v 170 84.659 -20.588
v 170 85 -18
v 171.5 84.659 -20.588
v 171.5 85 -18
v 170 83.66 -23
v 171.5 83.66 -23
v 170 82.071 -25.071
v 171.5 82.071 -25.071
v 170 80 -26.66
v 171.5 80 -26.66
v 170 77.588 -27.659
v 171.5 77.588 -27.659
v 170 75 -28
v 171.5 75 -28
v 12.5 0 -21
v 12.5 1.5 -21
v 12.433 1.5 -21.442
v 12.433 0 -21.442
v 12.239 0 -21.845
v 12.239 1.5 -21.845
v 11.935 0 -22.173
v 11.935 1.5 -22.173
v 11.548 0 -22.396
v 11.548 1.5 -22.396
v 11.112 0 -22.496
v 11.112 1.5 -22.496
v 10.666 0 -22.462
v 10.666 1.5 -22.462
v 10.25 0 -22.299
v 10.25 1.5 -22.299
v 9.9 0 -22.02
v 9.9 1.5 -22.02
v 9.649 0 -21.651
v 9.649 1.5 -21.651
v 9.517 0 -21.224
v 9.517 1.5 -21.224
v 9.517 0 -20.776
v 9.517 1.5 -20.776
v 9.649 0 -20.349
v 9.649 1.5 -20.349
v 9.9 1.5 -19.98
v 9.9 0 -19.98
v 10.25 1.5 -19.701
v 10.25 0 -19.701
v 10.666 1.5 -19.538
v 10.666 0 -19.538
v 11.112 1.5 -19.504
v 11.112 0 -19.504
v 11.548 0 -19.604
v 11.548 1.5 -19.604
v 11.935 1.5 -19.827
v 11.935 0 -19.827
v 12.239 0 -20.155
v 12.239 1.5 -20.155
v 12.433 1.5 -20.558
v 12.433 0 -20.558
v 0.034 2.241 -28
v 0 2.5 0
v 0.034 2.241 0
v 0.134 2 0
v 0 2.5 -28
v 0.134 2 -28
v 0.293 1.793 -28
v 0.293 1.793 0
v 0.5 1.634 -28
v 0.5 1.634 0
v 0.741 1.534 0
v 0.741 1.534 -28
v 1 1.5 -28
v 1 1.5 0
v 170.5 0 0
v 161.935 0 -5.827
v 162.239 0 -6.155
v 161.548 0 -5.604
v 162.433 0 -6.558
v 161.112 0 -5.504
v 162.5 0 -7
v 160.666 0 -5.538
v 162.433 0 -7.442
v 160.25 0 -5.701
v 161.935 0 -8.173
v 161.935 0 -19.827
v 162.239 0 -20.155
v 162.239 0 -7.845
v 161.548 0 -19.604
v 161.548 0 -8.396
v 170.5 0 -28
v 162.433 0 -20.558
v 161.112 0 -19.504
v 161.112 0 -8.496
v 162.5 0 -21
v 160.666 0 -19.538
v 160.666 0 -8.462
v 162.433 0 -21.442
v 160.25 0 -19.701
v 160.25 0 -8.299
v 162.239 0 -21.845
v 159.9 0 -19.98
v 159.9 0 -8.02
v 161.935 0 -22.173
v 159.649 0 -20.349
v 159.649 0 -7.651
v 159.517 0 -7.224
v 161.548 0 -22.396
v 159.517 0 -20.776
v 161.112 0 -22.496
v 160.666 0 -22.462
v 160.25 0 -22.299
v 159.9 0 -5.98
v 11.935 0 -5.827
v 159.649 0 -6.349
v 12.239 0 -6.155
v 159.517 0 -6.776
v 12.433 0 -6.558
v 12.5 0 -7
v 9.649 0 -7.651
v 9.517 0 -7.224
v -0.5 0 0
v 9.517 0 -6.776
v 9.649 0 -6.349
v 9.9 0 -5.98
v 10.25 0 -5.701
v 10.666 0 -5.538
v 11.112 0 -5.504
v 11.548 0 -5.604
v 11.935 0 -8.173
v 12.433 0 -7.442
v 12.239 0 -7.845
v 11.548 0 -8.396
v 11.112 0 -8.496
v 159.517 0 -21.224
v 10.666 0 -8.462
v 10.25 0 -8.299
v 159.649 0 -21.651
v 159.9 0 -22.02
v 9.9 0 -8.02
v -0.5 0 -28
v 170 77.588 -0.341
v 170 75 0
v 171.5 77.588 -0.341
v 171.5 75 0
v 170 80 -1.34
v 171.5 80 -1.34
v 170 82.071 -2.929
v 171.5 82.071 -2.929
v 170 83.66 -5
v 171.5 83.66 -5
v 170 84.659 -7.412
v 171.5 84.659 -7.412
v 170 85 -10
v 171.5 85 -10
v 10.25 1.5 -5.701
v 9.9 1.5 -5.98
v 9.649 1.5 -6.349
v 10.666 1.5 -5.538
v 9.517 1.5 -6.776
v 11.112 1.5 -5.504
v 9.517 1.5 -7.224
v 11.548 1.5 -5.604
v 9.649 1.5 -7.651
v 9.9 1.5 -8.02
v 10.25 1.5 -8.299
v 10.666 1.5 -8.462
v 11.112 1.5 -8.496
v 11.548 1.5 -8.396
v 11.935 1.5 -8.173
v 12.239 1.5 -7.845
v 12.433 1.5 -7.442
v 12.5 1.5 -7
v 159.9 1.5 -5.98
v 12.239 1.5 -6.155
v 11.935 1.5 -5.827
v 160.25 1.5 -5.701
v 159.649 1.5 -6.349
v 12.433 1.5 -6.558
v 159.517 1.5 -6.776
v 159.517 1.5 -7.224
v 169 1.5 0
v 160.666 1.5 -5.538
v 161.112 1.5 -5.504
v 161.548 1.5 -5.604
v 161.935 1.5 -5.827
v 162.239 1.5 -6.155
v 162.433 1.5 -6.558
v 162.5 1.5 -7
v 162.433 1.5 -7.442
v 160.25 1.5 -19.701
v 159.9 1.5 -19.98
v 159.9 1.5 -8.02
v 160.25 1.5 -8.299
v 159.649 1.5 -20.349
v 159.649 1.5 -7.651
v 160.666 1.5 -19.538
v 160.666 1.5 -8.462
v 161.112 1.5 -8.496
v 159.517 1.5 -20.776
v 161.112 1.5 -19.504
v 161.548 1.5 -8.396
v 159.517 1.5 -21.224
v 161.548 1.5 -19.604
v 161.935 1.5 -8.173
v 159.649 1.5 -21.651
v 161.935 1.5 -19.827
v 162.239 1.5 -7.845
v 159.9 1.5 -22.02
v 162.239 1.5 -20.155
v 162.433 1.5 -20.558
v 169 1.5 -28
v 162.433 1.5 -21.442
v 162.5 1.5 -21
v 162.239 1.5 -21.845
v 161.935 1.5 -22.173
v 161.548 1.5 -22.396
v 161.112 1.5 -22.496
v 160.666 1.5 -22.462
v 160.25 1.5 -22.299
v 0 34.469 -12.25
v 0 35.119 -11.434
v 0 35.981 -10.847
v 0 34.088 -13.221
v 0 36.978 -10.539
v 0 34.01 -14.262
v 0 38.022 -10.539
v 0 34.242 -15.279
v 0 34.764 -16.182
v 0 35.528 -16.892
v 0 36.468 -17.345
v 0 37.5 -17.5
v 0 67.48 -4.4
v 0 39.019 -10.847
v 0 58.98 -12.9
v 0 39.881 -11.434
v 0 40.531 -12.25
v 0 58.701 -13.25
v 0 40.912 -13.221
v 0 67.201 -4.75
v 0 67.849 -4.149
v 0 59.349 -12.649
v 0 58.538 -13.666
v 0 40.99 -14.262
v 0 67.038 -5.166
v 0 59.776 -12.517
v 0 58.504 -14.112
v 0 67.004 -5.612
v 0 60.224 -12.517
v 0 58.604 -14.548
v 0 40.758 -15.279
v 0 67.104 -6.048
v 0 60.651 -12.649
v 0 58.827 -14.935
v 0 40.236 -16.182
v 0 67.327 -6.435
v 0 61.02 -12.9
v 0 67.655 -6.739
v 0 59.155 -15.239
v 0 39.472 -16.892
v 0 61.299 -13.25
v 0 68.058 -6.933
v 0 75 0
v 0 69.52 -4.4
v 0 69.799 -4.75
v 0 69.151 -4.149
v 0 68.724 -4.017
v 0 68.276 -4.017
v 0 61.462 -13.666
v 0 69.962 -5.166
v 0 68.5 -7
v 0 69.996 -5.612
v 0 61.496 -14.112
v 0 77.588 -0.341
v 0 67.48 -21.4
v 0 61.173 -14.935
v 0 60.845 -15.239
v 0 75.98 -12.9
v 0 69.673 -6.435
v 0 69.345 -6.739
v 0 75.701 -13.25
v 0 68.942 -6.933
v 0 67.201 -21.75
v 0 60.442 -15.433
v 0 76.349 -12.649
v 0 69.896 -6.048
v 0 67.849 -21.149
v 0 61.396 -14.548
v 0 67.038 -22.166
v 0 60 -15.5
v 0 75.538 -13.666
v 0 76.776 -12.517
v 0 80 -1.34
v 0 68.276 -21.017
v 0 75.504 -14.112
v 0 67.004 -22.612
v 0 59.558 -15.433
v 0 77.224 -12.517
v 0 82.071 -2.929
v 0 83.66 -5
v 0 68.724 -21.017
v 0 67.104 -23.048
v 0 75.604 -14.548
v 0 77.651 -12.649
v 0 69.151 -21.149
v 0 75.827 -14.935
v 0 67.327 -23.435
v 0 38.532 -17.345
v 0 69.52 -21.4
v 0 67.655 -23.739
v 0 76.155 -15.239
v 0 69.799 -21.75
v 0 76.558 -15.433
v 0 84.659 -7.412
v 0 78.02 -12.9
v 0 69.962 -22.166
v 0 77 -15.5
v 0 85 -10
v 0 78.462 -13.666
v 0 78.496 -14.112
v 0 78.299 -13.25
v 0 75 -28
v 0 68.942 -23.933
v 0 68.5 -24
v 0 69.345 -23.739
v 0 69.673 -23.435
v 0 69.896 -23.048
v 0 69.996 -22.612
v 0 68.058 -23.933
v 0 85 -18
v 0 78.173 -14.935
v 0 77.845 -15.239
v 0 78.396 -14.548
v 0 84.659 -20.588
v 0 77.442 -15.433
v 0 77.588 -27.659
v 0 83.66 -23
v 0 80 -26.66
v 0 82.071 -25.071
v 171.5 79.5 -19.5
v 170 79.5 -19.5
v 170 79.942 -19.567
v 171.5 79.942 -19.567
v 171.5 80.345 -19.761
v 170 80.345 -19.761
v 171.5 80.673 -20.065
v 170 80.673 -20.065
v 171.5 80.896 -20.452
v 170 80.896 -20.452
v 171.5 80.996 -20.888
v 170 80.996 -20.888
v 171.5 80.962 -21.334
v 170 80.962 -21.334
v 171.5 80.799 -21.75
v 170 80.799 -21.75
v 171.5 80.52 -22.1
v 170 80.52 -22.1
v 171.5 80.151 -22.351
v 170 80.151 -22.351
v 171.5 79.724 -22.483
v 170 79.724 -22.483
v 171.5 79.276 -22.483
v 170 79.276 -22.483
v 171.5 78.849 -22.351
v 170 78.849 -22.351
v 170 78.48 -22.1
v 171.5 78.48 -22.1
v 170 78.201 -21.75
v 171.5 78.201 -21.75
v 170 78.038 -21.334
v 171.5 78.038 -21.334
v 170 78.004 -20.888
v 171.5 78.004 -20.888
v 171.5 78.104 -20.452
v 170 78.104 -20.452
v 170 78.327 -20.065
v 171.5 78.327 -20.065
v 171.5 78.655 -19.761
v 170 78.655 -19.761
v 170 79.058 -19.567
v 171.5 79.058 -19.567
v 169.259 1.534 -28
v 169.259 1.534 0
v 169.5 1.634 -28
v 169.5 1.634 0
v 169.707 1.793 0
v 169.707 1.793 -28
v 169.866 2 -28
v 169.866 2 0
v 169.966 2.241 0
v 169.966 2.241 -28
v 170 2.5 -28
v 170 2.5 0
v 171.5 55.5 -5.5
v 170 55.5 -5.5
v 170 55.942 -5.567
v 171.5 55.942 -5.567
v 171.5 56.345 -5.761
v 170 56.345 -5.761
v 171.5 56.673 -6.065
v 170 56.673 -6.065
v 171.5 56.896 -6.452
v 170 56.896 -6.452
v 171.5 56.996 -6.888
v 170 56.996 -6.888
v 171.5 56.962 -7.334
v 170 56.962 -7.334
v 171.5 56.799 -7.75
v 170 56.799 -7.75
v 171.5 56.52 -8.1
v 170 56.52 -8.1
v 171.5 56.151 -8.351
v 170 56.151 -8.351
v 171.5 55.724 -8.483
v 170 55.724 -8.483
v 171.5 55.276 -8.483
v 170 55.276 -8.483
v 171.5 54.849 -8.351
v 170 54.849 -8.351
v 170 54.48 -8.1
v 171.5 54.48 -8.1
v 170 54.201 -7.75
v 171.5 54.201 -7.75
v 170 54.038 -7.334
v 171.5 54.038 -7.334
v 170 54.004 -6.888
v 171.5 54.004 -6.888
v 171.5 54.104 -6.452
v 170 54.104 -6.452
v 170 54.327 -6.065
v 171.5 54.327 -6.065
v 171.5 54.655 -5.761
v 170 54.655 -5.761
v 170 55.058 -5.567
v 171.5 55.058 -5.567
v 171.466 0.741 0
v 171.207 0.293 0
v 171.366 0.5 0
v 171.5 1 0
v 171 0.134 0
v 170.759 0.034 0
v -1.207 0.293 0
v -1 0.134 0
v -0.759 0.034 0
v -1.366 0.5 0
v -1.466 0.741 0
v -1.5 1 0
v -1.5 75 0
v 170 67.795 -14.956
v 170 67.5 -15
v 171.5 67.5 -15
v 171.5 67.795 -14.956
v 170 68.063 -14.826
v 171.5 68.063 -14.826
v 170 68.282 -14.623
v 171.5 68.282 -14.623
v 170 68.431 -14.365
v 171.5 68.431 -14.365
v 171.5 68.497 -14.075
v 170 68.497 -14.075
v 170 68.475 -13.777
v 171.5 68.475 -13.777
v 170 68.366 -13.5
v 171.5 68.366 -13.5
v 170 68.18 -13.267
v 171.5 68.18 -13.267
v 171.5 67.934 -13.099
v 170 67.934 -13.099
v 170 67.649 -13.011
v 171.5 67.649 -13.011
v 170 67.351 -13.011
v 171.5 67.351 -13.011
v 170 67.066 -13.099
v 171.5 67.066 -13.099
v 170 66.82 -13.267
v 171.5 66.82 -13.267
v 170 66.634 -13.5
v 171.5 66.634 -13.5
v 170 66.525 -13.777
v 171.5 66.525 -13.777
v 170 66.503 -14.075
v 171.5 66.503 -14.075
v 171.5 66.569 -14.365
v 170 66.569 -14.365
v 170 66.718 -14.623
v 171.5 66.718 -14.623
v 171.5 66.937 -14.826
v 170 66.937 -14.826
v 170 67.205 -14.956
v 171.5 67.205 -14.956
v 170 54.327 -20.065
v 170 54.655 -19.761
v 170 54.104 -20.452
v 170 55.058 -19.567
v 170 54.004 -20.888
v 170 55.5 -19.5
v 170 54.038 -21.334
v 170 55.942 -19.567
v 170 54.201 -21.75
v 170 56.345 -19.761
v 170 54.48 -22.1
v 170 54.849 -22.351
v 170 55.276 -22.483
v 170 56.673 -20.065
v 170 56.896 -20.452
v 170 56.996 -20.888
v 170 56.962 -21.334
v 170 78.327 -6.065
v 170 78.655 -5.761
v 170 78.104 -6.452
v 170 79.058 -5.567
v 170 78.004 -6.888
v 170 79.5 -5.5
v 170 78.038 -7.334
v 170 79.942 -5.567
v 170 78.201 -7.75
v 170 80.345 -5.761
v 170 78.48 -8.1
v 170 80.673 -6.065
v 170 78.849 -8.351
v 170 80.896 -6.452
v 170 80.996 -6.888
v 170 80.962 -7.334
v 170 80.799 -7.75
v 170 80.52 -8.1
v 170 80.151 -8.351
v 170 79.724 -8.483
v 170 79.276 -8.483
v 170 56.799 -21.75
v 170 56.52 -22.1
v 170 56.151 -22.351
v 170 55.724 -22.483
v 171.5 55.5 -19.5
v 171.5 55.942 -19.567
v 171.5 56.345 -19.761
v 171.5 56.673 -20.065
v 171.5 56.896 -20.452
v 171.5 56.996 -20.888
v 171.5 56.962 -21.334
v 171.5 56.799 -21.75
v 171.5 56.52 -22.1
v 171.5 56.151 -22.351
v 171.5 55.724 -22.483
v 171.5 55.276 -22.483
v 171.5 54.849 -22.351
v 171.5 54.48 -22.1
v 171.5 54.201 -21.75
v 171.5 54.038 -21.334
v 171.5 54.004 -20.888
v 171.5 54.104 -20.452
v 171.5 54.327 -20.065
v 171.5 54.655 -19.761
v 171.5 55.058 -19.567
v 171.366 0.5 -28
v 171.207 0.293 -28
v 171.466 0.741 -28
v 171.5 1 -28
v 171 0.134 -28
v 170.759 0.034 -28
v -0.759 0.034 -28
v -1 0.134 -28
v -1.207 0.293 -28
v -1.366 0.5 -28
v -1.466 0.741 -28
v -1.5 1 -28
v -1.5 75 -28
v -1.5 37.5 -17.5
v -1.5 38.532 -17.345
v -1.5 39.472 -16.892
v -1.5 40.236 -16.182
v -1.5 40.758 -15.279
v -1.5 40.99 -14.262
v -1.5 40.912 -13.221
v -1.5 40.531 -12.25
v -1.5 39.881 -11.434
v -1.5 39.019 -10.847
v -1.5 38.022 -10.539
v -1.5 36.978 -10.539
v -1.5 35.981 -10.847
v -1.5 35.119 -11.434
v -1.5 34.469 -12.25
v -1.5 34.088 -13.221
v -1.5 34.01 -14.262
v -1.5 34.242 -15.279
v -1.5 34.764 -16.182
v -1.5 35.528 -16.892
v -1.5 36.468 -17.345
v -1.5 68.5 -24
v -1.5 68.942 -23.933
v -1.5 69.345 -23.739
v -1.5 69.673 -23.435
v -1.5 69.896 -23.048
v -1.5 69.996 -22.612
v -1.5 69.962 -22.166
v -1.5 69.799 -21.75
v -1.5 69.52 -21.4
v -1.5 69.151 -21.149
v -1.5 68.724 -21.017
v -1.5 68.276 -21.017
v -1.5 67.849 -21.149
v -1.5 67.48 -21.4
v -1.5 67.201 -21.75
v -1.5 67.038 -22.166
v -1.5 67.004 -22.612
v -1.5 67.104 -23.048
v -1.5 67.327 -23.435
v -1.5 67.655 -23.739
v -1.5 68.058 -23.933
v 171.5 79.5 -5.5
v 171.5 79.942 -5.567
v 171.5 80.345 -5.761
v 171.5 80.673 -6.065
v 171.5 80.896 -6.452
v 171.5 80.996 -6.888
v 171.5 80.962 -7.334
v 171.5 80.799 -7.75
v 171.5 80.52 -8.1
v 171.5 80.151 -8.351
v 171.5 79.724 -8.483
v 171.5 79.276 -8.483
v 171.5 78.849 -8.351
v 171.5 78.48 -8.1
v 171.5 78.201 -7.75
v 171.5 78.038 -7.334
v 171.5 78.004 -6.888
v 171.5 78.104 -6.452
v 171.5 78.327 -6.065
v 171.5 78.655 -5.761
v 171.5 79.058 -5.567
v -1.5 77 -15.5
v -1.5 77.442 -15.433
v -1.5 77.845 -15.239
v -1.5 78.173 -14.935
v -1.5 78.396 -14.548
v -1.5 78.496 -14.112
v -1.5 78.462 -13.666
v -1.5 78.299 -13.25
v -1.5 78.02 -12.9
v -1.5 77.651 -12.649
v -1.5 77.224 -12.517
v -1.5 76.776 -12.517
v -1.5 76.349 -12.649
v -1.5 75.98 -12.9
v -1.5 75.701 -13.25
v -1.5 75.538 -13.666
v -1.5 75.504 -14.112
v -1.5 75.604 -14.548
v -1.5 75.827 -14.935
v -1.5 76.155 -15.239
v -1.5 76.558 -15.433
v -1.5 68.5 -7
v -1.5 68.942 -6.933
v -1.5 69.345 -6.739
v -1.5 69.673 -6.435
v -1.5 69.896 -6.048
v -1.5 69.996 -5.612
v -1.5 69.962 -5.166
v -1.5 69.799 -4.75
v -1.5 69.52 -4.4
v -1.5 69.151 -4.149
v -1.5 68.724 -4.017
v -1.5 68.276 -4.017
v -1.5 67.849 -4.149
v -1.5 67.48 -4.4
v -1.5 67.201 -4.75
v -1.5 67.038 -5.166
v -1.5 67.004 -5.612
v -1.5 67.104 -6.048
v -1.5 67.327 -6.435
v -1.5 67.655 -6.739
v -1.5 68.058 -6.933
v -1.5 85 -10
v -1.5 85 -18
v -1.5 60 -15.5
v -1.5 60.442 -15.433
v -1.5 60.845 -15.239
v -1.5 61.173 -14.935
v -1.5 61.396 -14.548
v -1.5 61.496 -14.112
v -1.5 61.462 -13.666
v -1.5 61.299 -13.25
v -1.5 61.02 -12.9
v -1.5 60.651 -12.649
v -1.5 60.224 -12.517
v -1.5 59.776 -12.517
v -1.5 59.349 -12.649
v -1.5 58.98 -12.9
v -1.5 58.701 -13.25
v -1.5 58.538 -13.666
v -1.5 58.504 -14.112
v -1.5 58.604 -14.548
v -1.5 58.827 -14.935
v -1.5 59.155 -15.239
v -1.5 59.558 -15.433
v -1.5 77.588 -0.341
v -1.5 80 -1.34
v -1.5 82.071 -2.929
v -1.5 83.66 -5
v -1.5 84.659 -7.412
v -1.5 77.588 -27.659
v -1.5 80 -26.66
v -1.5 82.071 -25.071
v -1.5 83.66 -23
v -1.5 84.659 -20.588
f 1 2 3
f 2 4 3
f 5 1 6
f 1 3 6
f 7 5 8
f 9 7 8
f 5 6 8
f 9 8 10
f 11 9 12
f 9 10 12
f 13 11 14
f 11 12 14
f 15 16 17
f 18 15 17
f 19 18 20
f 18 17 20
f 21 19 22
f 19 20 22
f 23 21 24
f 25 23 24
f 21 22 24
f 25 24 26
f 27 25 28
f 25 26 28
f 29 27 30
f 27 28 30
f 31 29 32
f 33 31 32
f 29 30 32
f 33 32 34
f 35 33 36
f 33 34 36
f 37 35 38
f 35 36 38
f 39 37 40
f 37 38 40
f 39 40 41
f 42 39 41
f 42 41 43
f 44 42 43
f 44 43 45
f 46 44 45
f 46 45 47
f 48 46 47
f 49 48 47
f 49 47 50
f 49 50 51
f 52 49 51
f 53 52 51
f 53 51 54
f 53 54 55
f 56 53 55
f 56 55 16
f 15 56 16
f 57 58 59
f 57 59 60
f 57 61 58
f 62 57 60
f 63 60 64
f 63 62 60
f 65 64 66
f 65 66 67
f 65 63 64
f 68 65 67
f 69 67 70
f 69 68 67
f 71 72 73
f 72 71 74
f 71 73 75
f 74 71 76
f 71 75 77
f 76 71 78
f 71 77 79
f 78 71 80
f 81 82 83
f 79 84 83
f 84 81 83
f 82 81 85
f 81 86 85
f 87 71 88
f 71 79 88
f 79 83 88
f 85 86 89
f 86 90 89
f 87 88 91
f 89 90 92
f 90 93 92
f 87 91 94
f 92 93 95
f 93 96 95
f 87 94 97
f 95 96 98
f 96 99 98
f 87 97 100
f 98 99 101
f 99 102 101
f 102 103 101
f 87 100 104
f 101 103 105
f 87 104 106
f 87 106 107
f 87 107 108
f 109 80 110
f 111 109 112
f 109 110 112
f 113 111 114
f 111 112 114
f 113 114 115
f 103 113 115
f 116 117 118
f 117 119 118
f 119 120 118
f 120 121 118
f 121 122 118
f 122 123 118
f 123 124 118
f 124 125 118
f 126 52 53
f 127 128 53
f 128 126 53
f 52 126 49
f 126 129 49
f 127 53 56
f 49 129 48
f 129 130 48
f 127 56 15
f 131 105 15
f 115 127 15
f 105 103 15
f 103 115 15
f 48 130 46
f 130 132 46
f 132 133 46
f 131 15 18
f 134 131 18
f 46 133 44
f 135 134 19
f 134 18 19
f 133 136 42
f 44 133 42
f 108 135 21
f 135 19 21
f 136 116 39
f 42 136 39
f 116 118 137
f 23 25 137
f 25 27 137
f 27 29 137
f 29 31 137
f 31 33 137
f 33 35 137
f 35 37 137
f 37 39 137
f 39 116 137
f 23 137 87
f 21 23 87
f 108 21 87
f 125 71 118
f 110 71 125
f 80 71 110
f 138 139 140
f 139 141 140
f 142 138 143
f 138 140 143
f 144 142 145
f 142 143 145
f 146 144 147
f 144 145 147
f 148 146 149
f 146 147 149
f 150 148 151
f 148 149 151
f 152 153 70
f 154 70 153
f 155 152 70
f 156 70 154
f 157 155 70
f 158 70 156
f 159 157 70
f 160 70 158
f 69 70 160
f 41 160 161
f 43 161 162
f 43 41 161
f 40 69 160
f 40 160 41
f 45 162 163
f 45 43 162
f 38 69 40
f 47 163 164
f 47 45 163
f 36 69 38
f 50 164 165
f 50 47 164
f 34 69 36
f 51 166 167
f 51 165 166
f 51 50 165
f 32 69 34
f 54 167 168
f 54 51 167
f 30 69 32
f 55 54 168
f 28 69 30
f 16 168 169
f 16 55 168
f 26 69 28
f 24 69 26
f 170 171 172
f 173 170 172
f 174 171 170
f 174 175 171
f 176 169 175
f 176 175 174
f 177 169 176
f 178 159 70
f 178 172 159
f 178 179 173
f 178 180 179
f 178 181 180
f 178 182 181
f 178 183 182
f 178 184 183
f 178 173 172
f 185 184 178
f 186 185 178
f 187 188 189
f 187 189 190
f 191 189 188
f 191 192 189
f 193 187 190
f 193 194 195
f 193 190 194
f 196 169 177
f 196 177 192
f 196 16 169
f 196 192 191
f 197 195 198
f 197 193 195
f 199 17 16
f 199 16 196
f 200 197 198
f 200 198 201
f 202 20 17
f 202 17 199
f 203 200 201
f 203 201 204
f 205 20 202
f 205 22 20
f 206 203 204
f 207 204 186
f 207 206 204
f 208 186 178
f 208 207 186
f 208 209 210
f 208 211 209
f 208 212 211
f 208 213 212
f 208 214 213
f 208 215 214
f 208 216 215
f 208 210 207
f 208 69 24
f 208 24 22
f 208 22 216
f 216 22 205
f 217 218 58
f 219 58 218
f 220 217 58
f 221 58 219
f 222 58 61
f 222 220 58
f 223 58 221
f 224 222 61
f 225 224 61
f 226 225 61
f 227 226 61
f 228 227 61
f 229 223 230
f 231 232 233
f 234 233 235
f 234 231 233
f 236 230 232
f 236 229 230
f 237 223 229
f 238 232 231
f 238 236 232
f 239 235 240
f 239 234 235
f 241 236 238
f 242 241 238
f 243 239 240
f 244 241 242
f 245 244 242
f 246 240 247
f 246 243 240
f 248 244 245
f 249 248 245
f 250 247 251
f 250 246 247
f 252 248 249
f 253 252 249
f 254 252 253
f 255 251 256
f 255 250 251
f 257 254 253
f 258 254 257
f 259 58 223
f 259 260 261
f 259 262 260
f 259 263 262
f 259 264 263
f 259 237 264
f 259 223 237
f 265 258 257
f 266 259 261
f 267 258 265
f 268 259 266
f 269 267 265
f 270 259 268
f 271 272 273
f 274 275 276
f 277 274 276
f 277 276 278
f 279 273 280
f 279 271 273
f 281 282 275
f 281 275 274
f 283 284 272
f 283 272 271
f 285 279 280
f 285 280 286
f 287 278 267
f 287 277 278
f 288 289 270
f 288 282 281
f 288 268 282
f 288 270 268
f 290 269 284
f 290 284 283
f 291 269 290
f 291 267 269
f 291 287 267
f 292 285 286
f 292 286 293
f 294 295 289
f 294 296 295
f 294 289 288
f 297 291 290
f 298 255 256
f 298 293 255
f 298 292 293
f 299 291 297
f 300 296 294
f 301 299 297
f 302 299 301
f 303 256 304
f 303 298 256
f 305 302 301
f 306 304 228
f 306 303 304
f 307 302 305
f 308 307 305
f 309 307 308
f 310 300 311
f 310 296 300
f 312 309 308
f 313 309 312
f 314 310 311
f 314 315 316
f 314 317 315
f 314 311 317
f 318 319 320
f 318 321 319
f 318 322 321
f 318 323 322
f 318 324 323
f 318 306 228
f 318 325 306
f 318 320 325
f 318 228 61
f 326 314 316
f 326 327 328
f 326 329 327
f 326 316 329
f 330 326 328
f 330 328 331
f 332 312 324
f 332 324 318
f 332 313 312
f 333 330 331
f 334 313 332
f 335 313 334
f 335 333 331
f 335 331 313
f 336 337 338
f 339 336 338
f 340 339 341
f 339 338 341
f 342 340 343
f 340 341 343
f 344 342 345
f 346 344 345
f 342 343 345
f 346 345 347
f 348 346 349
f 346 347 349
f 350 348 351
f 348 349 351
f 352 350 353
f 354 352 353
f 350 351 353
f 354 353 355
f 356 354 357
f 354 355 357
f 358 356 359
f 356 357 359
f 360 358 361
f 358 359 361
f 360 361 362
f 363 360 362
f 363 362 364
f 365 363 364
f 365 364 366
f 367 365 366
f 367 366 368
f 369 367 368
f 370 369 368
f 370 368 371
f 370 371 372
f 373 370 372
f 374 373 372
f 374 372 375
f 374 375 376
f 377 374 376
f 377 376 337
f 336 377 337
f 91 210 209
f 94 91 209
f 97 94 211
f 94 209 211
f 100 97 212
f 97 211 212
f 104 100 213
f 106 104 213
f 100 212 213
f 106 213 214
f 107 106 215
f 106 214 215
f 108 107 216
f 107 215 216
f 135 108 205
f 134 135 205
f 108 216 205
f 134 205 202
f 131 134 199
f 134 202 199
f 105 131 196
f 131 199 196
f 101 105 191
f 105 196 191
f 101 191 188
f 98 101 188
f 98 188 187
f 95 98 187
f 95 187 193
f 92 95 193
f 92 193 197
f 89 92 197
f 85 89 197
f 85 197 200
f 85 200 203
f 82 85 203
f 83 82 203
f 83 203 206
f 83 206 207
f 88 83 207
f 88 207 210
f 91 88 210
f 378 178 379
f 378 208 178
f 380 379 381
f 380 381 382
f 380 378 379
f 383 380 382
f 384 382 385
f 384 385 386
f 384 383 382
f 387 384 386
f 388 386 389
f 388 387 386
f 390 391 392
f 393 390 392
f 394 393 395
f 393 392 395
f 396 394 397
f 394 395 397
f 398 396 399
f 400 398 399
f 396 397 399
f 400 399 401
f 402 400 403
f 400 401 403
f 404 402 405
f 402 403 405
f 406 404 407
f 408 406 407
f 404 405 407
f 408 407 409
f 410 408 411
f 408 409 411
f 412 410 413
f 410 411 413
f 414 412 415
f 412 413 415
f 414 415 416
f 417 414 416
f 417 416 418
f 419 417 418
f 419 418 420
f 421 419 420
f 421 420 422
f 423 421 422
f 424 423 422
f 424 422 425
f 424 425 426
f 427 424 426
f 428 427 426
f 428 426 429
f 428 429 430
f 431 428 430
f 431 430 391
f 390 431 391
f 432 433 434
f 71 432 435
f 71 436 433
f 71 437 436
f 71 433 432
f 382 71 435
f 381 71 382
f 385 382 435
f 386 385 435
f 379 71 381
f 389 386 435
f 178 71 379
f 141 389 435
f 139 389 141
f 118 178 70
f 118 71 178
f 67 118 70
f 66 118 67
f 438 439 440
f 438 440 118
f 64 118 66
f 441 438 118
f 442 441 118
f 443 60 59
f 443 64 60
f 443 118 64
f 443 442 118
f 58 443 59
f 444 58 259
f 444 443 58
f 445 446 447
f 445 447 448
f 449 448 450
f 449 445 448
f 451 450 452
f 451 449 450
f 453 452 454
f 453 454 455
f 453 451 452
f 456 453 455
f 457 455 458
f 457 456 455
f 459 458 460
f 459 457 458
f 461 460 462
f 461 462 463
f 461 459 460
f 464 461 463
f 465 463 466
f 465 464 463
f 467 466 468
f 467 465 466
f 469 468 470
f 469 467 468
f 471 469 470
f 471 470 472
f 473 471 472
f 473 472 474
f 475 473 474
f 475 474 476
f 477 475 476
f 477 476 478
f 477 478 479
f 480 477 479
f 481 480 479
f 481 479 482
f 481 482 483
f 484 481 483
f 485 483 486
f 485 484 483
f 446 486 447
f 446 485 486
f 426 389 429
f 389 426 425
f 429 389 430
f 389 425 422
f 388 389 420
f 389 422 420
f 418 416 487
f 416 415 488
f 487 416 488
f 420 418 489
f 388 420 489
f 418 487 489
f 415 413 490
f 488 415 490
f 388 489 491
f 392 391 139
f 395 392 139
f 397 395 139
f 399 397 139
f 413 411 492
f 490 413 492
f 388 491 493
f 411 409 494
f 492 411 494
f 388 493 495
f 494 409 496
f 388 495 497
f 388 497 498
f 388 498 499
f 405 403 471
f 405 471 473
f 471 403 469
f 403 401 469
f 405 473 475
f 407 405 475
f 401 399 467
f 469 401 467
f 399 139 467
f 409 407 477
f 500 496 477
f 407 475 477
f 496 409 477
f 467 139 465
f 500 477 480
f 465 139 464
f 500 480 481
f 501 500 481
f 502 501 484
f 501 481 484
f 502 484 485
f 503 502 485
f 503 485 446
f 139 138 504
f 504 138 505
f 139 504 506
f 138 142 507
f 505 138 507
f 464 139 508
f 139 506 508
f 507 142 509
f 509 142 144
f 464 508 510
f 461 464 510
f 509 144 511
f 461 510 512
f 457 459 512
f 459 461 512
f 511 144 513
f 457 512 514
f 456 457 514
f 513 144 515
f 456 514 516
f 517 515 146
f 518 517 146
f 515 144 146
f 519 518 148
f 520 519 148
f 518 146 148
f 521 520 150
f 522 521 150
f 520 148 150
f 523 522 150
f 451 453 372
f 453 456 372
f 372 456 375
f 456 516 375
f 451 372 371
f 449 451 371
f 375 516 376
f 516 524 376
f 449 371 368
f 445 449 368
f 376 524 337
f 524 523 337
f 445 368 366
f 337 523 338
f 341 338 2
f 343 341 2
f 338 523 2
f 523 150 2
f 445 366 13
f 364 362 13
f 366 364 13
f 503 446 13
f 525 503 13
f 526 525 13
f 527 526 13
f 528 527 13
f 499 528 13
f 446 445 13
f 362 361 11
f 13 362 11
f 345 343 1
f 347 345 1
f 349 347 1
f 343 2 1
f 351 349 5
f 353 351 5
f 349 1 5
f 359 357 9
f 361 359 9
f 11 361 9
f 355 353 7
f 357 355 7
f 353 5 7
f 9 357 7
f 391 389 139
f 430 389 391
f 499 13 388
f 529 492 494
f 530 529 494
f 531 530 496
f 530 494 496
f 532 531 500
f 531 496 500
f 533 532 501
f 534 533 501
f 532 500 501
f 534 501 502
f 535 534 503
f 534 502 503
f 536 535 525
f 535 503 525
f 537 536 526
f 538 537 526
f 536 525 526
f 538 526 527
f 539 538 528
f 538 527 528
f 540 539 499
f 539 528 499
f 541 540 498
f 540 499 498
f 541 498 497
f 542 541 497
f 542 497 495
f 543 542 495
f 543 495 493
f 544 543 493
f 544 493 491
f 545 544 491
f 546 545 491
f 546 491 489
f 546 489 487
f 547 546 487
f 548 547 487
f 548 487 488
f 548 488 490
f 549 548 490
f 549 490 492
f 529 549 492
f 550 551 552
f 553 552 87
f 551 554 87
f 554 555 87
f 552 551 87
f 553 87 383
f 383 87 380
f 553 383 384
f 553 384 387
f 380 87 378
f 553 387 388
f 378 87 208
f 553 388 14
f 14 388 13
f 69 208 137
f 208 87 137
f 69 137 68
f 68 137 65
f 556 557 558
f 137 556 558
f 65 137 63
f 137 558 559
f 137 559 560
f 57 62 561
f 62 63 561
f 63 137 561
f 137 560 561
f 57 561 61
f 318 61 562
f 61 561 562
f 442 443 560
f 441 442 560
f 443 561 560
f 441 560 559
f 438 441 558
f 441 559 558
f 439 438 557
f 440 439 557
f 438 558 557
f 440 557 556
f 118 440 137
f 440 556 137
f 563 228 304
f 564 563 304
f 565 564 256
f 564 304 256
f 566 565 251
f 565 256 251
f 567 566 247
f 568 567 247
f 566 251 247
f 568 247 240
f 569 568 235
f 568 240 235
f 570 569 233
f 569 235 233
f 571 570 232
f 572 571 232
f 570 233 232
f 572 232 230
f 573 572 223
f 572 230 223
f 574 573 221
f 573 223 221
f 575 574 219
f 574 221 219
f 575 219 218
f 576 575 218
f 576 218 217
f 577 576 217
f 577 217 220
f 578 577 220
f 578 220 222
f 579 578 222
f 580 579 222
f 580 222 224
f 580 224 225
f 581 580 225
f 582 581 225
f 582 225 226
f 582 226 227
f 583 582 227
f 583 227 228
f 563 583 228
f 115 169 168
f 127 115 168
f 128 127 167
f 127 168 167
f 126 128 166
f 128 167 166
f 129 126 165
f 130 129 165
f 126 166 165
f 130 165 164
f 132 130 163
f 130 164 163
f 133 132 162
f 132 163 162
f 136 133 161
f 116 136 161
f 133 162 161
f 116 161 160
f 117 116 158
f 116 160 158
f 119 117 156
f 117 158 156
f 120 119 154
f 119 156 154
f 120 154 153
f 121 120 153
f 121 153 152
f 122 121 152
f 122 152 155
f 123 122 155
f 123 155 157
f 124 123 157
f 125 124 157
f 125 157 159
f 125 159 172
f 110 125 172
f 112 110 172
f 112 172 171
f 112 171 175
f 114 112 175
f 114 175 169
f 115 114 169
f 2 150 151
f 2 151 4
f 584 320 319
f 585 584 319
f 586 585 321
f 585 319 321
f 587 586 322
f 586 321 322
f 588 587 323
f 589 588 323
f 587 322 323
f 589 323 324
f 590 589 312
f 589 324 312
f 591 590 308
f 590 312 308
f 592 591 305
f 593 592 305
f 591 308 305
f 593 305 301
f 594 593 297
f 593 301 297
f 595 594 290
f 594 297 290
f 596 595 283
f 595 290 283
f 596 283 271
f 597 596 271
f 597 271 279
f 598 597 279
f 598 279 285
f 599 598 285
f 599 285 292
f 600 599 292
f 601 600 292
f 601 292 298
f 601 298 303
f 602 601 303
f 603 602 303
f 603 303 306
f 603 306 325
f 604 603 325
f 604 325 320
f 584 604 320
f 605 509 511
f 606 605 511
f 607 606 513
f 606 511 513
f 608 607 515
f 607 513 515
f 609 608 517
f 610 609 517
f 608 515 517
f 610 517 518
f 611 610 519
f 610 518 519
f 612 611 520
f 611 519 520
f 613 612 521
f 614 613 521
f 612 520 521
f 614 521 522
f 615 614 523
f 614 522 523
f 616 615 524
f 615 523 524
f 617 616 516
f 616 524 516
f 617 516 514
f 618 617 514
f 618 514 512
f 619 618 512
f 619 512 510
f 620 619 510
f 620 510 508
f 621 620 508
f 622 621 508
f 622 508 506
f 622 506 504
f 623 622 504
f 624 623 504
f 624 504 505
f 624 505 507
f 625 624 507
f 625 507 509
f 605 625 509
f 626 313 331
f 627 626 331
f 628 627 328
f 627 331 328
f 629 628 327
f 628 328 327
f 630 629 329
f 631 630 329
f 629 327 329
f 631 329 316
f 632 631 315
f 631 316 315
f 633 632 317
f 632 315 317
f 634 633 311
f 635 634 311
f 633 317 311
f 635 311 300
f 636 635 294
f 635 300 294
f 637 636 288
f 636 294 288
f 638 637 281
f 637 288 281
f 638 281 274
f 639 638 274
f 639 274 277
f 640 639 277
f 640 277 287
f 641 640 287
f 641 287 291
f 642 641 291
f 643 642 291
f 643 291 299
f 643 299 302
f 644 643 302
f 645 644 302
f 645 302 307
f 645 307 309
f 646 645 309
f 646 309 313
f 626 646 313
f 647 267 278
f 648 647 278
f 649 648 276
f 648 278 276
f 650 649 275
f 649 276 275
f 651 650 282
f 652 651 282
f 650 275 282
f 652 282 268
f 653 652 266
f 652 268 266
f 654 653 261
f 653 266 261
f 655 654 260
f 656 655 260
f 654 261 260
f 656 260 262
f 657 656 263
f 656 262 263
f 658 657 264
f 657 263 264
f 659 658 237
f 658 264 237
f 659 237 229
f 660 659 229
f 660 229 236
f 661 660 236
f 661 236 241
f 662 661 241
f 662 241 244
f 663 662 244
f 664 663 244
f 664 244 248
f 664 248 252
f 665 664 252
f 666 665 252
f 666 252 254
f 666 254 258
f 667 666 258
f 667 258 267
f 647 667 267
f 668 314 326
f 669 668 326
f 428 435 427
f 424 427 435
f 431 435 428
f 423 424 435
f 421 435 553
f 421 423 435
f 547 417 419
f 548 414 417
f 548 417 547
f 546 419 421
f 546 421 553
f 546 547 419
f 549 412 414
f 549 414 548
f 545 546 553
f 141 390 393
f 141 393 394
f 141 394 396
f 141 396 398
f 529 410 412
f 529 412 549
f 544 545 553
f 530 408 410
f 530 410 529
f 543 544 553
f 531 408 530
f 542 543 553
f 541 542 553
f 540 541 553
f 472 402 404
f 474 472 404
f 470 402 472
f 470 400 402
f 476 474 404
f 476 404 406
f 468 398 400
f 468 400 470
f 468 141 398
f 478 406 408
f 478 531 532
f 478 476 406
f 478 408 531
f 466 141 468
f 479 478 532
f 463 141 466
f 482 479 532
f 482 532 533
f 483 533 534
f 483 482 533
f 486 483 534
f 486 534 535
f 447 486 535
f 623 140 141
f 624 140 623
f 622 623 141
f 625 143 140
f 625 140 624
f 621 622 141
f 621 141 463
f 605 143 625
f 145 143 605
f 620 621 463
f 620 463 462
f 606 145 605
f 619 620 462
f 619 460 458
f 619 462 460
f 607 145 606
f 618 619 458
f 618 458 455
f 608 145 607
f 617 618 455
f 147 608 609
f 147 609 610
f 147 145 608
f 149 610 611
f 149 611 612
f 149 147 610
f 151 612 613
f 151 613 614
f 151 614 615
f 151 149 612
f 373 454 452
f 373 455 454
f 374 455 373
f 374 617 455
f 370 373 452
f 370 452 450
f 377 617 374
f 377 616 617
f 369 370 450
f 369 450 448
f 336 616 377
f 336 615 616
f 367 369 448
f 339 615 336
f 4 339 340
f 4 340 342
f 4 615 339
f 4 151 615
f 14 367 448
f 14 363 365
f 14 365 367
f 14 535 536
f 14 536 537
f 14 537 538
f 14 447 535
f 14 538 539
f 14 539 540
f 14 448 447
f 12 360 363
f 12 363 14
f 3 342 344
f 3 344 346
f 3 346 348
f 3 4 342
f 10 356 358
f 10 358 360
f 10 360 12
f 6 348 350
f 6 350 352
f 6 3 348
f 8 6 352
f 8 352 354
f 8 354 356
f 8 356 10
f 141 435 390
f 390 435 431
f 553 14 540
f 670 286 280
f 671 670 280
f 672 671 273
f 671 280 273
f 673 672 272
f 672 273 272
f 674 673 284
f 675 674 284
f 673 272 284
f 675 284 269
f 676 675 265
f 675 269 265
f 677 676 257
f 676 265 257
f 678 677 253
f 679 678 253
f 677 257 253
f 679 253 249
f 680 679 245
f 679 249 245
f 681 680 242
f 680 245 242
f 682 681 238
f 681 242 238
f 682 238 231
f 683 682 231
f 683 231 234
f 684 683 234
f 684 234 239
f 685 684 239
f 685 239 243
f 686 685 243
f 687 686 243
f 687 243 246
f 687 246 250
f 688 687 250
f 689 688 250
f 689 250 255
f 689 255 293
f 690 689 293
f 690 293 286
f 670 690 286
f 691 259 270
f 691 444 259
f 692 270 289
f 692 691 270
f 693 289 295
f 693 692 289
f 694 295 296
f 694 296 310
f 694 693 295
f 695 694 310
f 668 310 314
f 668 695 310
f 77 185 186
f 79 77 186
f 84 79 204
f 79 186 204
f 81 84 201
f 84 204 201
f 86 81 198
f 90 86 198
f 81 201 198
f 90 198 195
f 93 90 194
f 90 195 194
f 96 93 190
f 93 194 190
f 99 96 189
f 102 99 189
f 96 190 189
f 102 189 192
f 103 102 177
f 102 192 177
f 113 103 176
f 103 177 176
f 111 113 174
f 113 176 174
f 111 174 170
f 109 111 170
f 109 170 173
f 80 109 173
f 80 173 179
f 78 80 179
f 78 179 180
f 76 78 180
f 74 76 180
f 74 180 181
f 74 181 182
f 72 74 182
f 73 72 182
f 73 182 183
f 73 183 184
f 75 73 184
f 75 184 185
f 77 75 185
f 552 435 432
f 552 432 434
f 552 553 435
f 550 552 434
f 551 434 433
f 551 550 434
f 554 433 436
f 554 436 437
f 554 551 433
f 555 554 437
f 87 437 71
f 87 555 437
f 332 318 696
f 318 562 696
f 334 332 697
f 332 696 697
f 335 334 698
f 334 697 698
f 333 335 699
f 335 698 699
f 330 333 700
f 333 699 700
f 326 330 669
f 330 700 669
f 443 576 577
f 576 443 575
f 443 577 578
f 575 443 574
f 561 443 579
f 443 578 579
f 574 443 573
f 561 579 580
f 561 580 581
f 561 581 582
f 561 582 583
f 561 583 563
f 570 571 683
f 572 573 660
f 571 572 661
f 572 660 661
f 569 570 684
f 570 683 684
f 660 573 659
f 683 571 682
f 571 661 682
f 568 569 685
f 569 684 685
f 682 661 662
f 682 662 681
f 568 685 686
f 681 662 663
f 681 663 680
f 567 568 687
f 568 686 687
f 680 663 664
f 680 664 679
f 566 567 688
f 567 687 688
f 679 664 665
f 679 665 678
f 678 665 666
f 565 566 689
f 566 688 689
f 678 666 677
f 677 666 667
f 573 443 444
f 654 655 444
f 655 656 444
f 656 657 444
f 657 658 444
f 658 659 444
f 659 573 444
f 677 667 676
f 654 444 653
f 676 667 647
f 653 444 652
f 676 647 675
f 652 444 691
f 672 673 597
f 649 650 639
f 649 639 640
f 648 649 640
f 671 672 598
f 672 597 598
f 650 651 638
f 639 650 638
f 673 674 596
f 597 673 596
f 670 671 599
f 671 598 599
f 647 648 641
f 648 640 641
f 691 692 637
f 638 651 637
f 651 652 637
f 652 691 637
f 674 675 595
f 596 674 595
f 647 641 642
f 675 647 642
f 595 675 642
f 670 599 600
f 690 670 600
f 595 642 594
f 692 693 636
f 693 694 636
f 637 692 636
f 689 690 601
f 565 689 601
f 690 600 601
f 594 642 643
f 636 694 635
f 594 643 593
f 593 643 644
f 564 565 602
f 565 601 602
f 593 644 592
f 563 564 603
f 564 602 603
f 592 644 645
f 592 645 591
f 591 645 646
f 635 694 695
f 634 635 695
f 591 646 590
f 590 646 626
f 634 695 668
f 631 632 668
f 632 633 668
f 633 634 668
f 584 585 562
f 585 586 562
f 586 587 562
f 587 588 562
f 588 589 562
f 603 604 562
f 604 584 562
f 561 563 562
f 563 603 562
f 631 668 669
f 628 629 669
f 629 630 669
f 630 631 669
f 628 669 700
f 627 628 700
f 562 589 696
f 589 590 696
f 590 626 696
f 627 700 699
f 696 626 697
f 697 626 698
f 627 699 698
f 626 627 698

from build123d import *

# Parameters (mm, degrees)
SKETCH1_W               = 170
SKETCH1_H               = 28
BOSS_EXTRUDE1_DEPTH     = 1.5
SKETCH2_W               = 28
SKETCH2_H               = 85
BOSS_EXTRUDE2_DEPTH     = 1.5
FILLET2_R               = 10
FILLET3_R               = 1
FILLET4_R               = 1
SKETCH5_R               = 1.5
CUT_EXTRUDE2_DEPTH      = 15
CUT_EXTRUDE2_DEPTH_BACK = 15
SKETCH7_R               = 3.5
CUT_EXTRUDE3_DEPTH      = 15
CUT_EXTRUDE3_DEPTH_BACK = 15
SKETCH8_R               = 1.5
CUT_EXTRUDE4_DEPTH      = 15
CUT_EXTRUDE4_DEPTH_BACK = 15
SKETCH11_W              = 28
SKETCH11_H              = 85
SKETCH11_R              = 1
BOSS_EXTRUDE5_DEPTH     = 1.5
FILLET5_R               = 1
FILLET6_R               = 1
FILLET7_R               = 10
FILLET8_R               = 10
SKETCH12_R              = 1.5
CUT_EXTRUDE5_DEPTH      = 10
CUT_EXTRUDE5_DEPTH_BACK = 10


with BuildPart() as part:
    # Sketch1 → Boss-Extrude1 (new body)
    with BuildSketch(Plane(origin=(0, 0, 0), x_dir=(1, 0, 0), z_dir=(0, 1, 0))):
        with Locations((85, 14)):
            Rectangle(SKETCH1_W, SKETCH1_H)
    extrude(amount=BOSS_EXTRUDE1_DEPTH)

    # Sketch2 → Boss-Extrude2 (add)
    with BuildSketch(Plane(origin=(0, 0, 0), x_dir=(0, 0, -1), z_dir=(1, 0, 0))):
        with Locations((14, 42.5)):
            Rectangle(SKETCH2_W, SKETCH2_H)
    extrude(amount=-BOSS_EXTRUDE2_DEPTH)

    # Fillet2
    fillet2_edges = [part.edges().sort_by_distance(p)[0] for p in [
        (-0.75, 85, -28),
        (-0.75, 85, 0),
    ]]
    fillet(fillet2_edges, radius=FILLET2_R)

    # Fillet3
    fillet3_edges = [part.edges().sort_by_distance(p)[0] for p in [
        (-1.5, 0, -14),
    ]]
    fillet(fillet3_edges, radius=FILLET3_R)

    # Fillet4
    fillet4_edges = [part.edges().sort_by_distance(p)[0] for p in [
        (0, 1.5, -14),
    ]]
    fillet(fillet4_edges, radius=FILLET4_R)

    # Sketch5 → Cut-Extrude2 (cut, two sides)
    with BuildSketch(Plane(origin=(0, 0, 0), x_dir=(0, 0, -1), z_dir=(1, 0, 0))) as cut_extrude2_sk:
        with Locations((14, 77)):
            Circle(SKETCH5_R)
        with Locations((14, 60)):
            Circle(SKETCH5_R)
        with Locations((22.5, 68.5)):
            Circle(SKETCH5_R)
        with Locations((5.5, 68.5)):
            Circle(SKETCH5_R)
    extrude(amount=CUT_EXTRUDE2_DEPTH, mode=Mode.SUBTRACT)
    extrude(cut_extrude2_sk.sketch, amount=-CUT_EXTRUDE2_DEPTH_BACK, mode=Mode.SUBTRACT)

    # Sketch7 → Cut-Extrude3 (cut, two sides)
    with BuildSketch(Plane(origin=(0, 0, 0), x_dir=(0, 0, -1), z_dir=(1, 0, 0))) as cut_extrude3_sk:
        with Locations((14, 37.5)):
            Circle(SKETCH7_R)
    extrude(amount=CUT_EXTRUDE3_DEPTH, mode=Mode.SUBTRACT)
    extrude(cut_extrude3_sk.sketch, amount=-CUT_EXTRUDE3_DEPTH_BACK, mode=Mode.SUBTRACT)

    # Sketch8 → Cut-Extrude4 (cut, two sides)
    with BuildSketch(Plane(origin=(0, 1.5, 0), x_dir=(1, 0, 0), z_dir=(0, 1, 0))) as cut_extrude4_sk:
        with Locations((161, 7)):
            Circle(SKETCH8_R)
        with Locations((11, 21)):
            Circle(SKETCH8_R)
        with Locations((11, 7)):
            Circle(SKETCH8_R)
        with Locations((161, 21)):
            Circle(SKETCH8_R)
    extrude(amount=CUT_EXTRUDE4_DEPTH, mode=Mode.SUBTRACT)
    extrude(cut_extrude4_sk.sketch, amount=-CUT_EXTRUDE4_DEPTH_BACK, mode=Mode.SUBTRACT)

    # Sketch11 → Boss-Extrude5 (add)
    with BuildSketch(Plane(origin=(170, 0, 0), x_dir=(0, 0, -1), z_dir=(1, 0, 0))):
        with Locations((14, 42.5)):
            Rectangle(SKETCH11_W, SKETCH11_H)
        with Locations((14, 67.5)):
            Circle(SKETCH11_R, mode=Mode.SUBTRACT)
    extrude(amount=BOSS_EXTRUDE5_DEPTH)

    # Fillet5
    fillet5_edges = [part.edges().sort_by_distance(p)[0] for p in [
        (170, 1.5, -14),
    ]]
    fillet(fillet5_edges, radius=FILLET5_R)

    # Fillet6
    fillet6_edges = [part.edges().sort_by_distance(p)[0] for p in [
        (171.5, 0, -14),
    ]]
    fillet(fillet6_edges, radius=FILLET6_R)

    # Fillet7
    fillet7_edges = [part.edges().sort_by_distance(p)[0] for p in [
        (170.75, 85, 0),
    ]]
    fillet(fillet7_edges, radius=FILLET7_R)

    # Fillet8
    fillet8_edges = [part.edges().sort_by_distance(p)[0] for p in [
        (170.75, 85, -28),
    ]]
    fillet(fillet8_edges, radius=FILLET8_R)

    # Sketch12 → Cut-Extrude5 (cut, two sides)
    with BuildSketch(Plane.ZY.offset(-170)) as cut_extrude5_sk:
        with Locations((-21, 79.5)):
            Circle(SKETCH12_R)
        with Locations((-7, 79.5)):
            Circle(SKETCH12_R)
        with Locations((-7, 55.5)):
            Circle(SKETCH12_R)
        with Locations((-21, 55.5)):
            Circle(SKETCH12_R)
    extrude(amount=CUT_EXTRUDE5_DEPTH, mode=Mode.SUBTRACT)
    extrude(cut_extrude5_sk.sketch, amount=-CUT_EXTRUDE5_DEPTH_BACK, mode=Mode.SUBTRACT)


solid = part.part
